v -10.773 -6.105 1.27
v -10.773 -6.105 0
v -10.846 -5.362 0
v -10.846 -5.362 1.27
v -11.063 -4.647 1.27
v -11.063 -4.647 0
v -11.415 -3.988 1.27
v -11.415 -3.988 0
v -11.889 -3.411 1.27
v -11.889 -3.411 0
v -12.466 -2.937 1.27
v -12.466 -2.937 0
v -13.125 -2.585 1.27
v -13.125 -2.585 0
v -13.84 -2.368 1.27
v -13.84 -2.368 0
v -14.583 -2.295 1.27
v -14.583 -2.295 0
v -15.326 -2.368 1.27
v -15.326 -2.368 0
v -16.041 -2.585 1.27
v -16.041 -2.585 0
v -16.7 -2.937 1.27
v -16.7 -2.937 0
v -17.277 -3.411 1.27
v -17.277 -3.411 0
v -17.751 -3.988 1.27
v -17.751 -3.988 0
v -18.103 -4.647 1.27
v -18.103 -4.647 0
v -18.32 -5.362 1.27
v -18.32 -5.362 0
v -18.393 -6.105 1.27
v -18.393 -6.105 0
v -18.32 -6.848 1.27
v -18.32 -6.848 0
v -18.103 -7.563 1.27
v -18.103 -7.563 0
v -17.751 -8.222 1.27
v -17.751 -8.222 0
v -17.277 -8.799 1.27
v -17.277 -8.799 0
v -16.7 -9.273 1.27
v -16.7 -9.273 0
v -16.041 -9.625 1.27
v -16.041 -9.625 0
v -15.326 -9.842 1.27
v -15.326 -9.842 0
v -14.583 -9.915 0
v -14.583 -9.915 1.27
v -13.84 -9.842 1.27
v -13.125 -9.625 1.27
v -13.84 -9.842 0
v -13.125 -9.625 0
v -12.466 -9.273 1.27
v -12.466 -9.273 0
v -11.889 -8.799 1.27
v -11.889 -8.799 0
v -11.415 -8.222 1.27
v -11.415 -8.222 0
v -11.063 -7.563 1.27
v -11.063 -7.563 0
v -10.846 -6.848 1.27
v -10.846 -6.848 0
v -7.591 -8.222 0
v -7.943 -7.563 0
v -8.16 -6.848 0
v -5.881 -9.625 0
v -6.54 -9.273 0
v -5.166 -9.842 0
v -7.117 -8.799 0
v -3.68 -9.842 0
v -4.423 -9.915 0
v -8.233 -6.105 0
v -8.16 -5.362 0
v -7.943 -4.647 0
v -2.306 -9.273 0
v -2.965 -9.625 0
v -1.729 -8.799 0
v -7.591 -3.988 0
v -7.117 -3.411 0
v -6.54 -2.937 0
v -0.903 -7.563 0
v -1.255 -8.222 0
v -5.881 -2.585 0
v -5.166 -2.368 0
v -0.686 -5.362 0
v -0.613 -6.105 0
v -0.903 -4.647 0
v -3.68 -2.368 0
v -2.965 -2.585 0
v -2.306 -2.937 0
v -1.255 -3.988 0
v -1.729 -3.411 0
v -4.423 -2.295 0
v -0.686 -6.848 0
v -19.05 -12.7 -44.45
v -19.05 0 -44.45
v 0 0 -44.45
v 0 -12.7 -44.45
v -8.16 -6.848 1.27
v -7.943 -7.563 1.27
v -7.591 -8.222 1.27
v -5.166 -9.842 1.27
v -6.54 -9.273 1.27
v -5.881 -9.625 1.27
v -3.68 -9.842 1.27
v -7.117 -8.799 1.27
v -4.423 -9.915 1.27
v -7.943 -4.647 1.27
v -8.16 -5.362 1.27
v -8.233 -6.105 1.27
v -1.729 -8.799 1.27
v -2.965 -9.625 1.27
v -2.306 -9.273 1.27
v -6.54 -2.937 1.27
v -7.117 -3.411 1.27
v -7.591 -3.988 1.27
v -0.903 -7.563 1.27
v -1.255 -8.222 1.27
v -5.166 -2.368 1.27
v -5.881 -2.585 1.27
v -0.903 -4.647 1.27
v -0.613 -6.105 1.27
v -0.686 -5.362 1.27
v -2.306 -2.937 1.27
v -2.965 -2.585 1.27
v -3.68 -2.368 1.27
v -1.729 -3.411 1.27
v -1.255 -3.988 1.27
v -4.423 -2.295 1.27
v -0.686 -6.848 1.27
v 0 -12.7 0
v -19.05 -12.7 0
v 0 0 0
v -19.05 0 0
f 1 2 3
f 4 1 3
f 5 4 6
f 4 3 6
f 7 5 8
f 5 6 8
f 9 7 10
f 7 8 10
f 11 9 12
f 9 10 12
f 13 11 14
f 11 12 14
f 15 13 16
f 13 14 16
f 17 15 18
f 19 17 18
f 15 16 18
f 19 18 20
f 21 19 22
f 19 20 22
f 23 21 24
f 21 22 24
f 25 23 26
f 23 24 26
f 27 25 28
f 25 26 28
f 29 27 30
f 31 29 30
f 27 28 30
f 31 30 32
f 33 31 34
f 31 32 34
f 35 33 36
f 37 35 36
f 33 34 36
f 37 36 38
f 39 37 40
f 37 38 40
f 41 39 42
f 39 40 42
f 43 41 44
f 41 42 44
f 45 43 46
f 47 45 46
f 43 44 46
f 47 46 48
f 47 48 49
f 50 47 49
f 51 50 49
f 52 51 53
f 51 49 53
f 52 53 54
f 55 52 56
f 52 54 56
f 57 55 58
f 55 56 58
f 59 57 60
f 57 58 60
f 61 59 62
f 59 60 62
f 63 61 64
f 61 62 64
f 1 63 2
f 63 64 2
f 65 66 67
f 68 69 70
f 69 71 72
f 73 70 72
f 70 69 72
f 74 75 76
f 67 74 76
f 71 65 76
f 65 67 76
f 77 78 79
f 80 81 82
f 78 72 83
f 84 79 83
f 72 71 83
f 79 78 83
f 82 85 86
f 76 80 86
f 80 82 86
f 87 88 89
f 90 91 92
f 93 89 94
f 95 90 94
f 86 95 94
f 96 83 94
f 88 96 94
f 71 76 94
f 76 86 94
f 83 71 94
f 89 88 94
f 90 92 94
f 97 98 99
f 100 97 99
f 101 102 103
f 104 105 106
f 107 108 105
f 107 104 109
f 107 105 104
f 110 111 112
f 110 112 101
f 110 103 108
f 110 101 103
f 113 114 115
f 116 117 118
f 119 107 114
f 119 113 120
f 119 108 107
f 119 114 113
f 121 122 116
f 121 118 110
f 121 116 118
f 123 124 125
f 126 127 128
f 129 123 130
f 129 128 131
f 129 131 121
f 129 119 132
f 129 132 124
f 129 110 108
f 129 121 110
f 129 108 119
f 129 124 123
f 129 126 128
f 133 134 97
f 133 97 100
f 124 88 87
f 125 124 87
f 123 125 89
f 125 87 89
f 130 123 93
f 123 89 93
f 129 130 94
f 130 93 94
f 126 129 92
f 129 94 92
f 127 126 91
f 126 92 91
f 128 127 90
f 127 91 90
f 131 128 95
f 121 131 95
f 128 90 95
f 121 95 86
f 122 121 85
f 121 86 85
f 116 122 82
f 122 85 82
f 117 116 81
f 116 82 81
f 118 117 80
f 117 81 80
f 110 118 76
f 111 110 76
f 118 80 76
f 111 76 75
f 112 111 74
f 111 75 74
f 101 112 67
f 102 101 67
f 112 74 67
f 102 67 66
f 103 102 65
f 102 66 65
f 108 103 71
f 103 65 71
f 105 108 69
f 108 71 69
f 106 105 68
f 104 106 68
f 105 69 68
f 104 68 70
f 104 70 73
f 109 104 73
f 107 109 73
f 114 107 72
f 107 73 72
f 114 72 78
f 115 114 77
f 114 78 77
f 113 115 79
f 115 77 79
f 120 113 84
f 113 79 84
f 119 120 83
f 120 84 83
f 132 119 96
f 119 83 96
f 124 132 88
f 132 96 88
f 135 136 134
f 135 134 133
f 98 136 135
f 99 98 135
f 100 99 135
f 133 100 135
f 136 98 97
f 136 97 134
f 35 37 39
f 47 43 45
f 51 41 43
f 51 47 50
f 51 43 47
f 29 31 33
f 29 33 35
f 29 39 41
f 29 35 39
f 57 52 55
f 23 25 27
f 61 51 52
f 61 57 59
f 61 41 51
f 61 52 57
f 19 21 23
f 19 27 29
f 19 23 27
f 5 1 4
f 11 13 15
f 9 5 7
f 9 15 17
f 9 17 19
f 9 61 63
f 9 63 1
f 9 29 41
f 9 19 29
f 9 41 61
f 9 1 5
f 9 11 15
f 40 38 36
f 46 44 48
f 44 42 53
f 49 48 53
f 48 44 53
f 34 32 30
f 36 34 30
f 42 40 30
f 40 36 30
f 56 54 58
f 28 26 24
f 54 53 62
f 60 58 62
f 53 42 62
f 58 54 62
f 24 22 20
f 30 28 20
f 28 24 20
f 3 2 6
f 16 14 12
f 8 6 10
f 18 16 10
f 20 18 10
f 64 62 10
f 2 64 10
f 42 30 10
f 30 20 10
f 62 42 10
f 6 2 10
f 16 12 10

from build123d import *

# Parameters (mm, degrees)
F0_W     = 19.05
F0_H     = 44.45
F1_DEPTH = 12.7
F2_R     = 3.81
F3_DEPTH = 1.27


with BuildPart() as f1:
    # F0 (on Front) → F1 (new body)
    with BuildSketch(Plane.XZ):
        with Locations((-9.525, -22.225)):
            Rectangle(F0_W, F0_H)
    extrude(amount=F1_DEPTH)


with BuildPart() as f3:
    # F2 (on face) → F3 (new body)
    with BuildSketch(Plane.XY):
        with Locations((-14.582819, -6.104887)):
            Circle(F2_R)
        with Locations((-4.422819, -6.104887)):
            Circle(F2_R)
    extrude(amount=F3_DEPTH)


solid = Compound([f1.part, f3.part])
